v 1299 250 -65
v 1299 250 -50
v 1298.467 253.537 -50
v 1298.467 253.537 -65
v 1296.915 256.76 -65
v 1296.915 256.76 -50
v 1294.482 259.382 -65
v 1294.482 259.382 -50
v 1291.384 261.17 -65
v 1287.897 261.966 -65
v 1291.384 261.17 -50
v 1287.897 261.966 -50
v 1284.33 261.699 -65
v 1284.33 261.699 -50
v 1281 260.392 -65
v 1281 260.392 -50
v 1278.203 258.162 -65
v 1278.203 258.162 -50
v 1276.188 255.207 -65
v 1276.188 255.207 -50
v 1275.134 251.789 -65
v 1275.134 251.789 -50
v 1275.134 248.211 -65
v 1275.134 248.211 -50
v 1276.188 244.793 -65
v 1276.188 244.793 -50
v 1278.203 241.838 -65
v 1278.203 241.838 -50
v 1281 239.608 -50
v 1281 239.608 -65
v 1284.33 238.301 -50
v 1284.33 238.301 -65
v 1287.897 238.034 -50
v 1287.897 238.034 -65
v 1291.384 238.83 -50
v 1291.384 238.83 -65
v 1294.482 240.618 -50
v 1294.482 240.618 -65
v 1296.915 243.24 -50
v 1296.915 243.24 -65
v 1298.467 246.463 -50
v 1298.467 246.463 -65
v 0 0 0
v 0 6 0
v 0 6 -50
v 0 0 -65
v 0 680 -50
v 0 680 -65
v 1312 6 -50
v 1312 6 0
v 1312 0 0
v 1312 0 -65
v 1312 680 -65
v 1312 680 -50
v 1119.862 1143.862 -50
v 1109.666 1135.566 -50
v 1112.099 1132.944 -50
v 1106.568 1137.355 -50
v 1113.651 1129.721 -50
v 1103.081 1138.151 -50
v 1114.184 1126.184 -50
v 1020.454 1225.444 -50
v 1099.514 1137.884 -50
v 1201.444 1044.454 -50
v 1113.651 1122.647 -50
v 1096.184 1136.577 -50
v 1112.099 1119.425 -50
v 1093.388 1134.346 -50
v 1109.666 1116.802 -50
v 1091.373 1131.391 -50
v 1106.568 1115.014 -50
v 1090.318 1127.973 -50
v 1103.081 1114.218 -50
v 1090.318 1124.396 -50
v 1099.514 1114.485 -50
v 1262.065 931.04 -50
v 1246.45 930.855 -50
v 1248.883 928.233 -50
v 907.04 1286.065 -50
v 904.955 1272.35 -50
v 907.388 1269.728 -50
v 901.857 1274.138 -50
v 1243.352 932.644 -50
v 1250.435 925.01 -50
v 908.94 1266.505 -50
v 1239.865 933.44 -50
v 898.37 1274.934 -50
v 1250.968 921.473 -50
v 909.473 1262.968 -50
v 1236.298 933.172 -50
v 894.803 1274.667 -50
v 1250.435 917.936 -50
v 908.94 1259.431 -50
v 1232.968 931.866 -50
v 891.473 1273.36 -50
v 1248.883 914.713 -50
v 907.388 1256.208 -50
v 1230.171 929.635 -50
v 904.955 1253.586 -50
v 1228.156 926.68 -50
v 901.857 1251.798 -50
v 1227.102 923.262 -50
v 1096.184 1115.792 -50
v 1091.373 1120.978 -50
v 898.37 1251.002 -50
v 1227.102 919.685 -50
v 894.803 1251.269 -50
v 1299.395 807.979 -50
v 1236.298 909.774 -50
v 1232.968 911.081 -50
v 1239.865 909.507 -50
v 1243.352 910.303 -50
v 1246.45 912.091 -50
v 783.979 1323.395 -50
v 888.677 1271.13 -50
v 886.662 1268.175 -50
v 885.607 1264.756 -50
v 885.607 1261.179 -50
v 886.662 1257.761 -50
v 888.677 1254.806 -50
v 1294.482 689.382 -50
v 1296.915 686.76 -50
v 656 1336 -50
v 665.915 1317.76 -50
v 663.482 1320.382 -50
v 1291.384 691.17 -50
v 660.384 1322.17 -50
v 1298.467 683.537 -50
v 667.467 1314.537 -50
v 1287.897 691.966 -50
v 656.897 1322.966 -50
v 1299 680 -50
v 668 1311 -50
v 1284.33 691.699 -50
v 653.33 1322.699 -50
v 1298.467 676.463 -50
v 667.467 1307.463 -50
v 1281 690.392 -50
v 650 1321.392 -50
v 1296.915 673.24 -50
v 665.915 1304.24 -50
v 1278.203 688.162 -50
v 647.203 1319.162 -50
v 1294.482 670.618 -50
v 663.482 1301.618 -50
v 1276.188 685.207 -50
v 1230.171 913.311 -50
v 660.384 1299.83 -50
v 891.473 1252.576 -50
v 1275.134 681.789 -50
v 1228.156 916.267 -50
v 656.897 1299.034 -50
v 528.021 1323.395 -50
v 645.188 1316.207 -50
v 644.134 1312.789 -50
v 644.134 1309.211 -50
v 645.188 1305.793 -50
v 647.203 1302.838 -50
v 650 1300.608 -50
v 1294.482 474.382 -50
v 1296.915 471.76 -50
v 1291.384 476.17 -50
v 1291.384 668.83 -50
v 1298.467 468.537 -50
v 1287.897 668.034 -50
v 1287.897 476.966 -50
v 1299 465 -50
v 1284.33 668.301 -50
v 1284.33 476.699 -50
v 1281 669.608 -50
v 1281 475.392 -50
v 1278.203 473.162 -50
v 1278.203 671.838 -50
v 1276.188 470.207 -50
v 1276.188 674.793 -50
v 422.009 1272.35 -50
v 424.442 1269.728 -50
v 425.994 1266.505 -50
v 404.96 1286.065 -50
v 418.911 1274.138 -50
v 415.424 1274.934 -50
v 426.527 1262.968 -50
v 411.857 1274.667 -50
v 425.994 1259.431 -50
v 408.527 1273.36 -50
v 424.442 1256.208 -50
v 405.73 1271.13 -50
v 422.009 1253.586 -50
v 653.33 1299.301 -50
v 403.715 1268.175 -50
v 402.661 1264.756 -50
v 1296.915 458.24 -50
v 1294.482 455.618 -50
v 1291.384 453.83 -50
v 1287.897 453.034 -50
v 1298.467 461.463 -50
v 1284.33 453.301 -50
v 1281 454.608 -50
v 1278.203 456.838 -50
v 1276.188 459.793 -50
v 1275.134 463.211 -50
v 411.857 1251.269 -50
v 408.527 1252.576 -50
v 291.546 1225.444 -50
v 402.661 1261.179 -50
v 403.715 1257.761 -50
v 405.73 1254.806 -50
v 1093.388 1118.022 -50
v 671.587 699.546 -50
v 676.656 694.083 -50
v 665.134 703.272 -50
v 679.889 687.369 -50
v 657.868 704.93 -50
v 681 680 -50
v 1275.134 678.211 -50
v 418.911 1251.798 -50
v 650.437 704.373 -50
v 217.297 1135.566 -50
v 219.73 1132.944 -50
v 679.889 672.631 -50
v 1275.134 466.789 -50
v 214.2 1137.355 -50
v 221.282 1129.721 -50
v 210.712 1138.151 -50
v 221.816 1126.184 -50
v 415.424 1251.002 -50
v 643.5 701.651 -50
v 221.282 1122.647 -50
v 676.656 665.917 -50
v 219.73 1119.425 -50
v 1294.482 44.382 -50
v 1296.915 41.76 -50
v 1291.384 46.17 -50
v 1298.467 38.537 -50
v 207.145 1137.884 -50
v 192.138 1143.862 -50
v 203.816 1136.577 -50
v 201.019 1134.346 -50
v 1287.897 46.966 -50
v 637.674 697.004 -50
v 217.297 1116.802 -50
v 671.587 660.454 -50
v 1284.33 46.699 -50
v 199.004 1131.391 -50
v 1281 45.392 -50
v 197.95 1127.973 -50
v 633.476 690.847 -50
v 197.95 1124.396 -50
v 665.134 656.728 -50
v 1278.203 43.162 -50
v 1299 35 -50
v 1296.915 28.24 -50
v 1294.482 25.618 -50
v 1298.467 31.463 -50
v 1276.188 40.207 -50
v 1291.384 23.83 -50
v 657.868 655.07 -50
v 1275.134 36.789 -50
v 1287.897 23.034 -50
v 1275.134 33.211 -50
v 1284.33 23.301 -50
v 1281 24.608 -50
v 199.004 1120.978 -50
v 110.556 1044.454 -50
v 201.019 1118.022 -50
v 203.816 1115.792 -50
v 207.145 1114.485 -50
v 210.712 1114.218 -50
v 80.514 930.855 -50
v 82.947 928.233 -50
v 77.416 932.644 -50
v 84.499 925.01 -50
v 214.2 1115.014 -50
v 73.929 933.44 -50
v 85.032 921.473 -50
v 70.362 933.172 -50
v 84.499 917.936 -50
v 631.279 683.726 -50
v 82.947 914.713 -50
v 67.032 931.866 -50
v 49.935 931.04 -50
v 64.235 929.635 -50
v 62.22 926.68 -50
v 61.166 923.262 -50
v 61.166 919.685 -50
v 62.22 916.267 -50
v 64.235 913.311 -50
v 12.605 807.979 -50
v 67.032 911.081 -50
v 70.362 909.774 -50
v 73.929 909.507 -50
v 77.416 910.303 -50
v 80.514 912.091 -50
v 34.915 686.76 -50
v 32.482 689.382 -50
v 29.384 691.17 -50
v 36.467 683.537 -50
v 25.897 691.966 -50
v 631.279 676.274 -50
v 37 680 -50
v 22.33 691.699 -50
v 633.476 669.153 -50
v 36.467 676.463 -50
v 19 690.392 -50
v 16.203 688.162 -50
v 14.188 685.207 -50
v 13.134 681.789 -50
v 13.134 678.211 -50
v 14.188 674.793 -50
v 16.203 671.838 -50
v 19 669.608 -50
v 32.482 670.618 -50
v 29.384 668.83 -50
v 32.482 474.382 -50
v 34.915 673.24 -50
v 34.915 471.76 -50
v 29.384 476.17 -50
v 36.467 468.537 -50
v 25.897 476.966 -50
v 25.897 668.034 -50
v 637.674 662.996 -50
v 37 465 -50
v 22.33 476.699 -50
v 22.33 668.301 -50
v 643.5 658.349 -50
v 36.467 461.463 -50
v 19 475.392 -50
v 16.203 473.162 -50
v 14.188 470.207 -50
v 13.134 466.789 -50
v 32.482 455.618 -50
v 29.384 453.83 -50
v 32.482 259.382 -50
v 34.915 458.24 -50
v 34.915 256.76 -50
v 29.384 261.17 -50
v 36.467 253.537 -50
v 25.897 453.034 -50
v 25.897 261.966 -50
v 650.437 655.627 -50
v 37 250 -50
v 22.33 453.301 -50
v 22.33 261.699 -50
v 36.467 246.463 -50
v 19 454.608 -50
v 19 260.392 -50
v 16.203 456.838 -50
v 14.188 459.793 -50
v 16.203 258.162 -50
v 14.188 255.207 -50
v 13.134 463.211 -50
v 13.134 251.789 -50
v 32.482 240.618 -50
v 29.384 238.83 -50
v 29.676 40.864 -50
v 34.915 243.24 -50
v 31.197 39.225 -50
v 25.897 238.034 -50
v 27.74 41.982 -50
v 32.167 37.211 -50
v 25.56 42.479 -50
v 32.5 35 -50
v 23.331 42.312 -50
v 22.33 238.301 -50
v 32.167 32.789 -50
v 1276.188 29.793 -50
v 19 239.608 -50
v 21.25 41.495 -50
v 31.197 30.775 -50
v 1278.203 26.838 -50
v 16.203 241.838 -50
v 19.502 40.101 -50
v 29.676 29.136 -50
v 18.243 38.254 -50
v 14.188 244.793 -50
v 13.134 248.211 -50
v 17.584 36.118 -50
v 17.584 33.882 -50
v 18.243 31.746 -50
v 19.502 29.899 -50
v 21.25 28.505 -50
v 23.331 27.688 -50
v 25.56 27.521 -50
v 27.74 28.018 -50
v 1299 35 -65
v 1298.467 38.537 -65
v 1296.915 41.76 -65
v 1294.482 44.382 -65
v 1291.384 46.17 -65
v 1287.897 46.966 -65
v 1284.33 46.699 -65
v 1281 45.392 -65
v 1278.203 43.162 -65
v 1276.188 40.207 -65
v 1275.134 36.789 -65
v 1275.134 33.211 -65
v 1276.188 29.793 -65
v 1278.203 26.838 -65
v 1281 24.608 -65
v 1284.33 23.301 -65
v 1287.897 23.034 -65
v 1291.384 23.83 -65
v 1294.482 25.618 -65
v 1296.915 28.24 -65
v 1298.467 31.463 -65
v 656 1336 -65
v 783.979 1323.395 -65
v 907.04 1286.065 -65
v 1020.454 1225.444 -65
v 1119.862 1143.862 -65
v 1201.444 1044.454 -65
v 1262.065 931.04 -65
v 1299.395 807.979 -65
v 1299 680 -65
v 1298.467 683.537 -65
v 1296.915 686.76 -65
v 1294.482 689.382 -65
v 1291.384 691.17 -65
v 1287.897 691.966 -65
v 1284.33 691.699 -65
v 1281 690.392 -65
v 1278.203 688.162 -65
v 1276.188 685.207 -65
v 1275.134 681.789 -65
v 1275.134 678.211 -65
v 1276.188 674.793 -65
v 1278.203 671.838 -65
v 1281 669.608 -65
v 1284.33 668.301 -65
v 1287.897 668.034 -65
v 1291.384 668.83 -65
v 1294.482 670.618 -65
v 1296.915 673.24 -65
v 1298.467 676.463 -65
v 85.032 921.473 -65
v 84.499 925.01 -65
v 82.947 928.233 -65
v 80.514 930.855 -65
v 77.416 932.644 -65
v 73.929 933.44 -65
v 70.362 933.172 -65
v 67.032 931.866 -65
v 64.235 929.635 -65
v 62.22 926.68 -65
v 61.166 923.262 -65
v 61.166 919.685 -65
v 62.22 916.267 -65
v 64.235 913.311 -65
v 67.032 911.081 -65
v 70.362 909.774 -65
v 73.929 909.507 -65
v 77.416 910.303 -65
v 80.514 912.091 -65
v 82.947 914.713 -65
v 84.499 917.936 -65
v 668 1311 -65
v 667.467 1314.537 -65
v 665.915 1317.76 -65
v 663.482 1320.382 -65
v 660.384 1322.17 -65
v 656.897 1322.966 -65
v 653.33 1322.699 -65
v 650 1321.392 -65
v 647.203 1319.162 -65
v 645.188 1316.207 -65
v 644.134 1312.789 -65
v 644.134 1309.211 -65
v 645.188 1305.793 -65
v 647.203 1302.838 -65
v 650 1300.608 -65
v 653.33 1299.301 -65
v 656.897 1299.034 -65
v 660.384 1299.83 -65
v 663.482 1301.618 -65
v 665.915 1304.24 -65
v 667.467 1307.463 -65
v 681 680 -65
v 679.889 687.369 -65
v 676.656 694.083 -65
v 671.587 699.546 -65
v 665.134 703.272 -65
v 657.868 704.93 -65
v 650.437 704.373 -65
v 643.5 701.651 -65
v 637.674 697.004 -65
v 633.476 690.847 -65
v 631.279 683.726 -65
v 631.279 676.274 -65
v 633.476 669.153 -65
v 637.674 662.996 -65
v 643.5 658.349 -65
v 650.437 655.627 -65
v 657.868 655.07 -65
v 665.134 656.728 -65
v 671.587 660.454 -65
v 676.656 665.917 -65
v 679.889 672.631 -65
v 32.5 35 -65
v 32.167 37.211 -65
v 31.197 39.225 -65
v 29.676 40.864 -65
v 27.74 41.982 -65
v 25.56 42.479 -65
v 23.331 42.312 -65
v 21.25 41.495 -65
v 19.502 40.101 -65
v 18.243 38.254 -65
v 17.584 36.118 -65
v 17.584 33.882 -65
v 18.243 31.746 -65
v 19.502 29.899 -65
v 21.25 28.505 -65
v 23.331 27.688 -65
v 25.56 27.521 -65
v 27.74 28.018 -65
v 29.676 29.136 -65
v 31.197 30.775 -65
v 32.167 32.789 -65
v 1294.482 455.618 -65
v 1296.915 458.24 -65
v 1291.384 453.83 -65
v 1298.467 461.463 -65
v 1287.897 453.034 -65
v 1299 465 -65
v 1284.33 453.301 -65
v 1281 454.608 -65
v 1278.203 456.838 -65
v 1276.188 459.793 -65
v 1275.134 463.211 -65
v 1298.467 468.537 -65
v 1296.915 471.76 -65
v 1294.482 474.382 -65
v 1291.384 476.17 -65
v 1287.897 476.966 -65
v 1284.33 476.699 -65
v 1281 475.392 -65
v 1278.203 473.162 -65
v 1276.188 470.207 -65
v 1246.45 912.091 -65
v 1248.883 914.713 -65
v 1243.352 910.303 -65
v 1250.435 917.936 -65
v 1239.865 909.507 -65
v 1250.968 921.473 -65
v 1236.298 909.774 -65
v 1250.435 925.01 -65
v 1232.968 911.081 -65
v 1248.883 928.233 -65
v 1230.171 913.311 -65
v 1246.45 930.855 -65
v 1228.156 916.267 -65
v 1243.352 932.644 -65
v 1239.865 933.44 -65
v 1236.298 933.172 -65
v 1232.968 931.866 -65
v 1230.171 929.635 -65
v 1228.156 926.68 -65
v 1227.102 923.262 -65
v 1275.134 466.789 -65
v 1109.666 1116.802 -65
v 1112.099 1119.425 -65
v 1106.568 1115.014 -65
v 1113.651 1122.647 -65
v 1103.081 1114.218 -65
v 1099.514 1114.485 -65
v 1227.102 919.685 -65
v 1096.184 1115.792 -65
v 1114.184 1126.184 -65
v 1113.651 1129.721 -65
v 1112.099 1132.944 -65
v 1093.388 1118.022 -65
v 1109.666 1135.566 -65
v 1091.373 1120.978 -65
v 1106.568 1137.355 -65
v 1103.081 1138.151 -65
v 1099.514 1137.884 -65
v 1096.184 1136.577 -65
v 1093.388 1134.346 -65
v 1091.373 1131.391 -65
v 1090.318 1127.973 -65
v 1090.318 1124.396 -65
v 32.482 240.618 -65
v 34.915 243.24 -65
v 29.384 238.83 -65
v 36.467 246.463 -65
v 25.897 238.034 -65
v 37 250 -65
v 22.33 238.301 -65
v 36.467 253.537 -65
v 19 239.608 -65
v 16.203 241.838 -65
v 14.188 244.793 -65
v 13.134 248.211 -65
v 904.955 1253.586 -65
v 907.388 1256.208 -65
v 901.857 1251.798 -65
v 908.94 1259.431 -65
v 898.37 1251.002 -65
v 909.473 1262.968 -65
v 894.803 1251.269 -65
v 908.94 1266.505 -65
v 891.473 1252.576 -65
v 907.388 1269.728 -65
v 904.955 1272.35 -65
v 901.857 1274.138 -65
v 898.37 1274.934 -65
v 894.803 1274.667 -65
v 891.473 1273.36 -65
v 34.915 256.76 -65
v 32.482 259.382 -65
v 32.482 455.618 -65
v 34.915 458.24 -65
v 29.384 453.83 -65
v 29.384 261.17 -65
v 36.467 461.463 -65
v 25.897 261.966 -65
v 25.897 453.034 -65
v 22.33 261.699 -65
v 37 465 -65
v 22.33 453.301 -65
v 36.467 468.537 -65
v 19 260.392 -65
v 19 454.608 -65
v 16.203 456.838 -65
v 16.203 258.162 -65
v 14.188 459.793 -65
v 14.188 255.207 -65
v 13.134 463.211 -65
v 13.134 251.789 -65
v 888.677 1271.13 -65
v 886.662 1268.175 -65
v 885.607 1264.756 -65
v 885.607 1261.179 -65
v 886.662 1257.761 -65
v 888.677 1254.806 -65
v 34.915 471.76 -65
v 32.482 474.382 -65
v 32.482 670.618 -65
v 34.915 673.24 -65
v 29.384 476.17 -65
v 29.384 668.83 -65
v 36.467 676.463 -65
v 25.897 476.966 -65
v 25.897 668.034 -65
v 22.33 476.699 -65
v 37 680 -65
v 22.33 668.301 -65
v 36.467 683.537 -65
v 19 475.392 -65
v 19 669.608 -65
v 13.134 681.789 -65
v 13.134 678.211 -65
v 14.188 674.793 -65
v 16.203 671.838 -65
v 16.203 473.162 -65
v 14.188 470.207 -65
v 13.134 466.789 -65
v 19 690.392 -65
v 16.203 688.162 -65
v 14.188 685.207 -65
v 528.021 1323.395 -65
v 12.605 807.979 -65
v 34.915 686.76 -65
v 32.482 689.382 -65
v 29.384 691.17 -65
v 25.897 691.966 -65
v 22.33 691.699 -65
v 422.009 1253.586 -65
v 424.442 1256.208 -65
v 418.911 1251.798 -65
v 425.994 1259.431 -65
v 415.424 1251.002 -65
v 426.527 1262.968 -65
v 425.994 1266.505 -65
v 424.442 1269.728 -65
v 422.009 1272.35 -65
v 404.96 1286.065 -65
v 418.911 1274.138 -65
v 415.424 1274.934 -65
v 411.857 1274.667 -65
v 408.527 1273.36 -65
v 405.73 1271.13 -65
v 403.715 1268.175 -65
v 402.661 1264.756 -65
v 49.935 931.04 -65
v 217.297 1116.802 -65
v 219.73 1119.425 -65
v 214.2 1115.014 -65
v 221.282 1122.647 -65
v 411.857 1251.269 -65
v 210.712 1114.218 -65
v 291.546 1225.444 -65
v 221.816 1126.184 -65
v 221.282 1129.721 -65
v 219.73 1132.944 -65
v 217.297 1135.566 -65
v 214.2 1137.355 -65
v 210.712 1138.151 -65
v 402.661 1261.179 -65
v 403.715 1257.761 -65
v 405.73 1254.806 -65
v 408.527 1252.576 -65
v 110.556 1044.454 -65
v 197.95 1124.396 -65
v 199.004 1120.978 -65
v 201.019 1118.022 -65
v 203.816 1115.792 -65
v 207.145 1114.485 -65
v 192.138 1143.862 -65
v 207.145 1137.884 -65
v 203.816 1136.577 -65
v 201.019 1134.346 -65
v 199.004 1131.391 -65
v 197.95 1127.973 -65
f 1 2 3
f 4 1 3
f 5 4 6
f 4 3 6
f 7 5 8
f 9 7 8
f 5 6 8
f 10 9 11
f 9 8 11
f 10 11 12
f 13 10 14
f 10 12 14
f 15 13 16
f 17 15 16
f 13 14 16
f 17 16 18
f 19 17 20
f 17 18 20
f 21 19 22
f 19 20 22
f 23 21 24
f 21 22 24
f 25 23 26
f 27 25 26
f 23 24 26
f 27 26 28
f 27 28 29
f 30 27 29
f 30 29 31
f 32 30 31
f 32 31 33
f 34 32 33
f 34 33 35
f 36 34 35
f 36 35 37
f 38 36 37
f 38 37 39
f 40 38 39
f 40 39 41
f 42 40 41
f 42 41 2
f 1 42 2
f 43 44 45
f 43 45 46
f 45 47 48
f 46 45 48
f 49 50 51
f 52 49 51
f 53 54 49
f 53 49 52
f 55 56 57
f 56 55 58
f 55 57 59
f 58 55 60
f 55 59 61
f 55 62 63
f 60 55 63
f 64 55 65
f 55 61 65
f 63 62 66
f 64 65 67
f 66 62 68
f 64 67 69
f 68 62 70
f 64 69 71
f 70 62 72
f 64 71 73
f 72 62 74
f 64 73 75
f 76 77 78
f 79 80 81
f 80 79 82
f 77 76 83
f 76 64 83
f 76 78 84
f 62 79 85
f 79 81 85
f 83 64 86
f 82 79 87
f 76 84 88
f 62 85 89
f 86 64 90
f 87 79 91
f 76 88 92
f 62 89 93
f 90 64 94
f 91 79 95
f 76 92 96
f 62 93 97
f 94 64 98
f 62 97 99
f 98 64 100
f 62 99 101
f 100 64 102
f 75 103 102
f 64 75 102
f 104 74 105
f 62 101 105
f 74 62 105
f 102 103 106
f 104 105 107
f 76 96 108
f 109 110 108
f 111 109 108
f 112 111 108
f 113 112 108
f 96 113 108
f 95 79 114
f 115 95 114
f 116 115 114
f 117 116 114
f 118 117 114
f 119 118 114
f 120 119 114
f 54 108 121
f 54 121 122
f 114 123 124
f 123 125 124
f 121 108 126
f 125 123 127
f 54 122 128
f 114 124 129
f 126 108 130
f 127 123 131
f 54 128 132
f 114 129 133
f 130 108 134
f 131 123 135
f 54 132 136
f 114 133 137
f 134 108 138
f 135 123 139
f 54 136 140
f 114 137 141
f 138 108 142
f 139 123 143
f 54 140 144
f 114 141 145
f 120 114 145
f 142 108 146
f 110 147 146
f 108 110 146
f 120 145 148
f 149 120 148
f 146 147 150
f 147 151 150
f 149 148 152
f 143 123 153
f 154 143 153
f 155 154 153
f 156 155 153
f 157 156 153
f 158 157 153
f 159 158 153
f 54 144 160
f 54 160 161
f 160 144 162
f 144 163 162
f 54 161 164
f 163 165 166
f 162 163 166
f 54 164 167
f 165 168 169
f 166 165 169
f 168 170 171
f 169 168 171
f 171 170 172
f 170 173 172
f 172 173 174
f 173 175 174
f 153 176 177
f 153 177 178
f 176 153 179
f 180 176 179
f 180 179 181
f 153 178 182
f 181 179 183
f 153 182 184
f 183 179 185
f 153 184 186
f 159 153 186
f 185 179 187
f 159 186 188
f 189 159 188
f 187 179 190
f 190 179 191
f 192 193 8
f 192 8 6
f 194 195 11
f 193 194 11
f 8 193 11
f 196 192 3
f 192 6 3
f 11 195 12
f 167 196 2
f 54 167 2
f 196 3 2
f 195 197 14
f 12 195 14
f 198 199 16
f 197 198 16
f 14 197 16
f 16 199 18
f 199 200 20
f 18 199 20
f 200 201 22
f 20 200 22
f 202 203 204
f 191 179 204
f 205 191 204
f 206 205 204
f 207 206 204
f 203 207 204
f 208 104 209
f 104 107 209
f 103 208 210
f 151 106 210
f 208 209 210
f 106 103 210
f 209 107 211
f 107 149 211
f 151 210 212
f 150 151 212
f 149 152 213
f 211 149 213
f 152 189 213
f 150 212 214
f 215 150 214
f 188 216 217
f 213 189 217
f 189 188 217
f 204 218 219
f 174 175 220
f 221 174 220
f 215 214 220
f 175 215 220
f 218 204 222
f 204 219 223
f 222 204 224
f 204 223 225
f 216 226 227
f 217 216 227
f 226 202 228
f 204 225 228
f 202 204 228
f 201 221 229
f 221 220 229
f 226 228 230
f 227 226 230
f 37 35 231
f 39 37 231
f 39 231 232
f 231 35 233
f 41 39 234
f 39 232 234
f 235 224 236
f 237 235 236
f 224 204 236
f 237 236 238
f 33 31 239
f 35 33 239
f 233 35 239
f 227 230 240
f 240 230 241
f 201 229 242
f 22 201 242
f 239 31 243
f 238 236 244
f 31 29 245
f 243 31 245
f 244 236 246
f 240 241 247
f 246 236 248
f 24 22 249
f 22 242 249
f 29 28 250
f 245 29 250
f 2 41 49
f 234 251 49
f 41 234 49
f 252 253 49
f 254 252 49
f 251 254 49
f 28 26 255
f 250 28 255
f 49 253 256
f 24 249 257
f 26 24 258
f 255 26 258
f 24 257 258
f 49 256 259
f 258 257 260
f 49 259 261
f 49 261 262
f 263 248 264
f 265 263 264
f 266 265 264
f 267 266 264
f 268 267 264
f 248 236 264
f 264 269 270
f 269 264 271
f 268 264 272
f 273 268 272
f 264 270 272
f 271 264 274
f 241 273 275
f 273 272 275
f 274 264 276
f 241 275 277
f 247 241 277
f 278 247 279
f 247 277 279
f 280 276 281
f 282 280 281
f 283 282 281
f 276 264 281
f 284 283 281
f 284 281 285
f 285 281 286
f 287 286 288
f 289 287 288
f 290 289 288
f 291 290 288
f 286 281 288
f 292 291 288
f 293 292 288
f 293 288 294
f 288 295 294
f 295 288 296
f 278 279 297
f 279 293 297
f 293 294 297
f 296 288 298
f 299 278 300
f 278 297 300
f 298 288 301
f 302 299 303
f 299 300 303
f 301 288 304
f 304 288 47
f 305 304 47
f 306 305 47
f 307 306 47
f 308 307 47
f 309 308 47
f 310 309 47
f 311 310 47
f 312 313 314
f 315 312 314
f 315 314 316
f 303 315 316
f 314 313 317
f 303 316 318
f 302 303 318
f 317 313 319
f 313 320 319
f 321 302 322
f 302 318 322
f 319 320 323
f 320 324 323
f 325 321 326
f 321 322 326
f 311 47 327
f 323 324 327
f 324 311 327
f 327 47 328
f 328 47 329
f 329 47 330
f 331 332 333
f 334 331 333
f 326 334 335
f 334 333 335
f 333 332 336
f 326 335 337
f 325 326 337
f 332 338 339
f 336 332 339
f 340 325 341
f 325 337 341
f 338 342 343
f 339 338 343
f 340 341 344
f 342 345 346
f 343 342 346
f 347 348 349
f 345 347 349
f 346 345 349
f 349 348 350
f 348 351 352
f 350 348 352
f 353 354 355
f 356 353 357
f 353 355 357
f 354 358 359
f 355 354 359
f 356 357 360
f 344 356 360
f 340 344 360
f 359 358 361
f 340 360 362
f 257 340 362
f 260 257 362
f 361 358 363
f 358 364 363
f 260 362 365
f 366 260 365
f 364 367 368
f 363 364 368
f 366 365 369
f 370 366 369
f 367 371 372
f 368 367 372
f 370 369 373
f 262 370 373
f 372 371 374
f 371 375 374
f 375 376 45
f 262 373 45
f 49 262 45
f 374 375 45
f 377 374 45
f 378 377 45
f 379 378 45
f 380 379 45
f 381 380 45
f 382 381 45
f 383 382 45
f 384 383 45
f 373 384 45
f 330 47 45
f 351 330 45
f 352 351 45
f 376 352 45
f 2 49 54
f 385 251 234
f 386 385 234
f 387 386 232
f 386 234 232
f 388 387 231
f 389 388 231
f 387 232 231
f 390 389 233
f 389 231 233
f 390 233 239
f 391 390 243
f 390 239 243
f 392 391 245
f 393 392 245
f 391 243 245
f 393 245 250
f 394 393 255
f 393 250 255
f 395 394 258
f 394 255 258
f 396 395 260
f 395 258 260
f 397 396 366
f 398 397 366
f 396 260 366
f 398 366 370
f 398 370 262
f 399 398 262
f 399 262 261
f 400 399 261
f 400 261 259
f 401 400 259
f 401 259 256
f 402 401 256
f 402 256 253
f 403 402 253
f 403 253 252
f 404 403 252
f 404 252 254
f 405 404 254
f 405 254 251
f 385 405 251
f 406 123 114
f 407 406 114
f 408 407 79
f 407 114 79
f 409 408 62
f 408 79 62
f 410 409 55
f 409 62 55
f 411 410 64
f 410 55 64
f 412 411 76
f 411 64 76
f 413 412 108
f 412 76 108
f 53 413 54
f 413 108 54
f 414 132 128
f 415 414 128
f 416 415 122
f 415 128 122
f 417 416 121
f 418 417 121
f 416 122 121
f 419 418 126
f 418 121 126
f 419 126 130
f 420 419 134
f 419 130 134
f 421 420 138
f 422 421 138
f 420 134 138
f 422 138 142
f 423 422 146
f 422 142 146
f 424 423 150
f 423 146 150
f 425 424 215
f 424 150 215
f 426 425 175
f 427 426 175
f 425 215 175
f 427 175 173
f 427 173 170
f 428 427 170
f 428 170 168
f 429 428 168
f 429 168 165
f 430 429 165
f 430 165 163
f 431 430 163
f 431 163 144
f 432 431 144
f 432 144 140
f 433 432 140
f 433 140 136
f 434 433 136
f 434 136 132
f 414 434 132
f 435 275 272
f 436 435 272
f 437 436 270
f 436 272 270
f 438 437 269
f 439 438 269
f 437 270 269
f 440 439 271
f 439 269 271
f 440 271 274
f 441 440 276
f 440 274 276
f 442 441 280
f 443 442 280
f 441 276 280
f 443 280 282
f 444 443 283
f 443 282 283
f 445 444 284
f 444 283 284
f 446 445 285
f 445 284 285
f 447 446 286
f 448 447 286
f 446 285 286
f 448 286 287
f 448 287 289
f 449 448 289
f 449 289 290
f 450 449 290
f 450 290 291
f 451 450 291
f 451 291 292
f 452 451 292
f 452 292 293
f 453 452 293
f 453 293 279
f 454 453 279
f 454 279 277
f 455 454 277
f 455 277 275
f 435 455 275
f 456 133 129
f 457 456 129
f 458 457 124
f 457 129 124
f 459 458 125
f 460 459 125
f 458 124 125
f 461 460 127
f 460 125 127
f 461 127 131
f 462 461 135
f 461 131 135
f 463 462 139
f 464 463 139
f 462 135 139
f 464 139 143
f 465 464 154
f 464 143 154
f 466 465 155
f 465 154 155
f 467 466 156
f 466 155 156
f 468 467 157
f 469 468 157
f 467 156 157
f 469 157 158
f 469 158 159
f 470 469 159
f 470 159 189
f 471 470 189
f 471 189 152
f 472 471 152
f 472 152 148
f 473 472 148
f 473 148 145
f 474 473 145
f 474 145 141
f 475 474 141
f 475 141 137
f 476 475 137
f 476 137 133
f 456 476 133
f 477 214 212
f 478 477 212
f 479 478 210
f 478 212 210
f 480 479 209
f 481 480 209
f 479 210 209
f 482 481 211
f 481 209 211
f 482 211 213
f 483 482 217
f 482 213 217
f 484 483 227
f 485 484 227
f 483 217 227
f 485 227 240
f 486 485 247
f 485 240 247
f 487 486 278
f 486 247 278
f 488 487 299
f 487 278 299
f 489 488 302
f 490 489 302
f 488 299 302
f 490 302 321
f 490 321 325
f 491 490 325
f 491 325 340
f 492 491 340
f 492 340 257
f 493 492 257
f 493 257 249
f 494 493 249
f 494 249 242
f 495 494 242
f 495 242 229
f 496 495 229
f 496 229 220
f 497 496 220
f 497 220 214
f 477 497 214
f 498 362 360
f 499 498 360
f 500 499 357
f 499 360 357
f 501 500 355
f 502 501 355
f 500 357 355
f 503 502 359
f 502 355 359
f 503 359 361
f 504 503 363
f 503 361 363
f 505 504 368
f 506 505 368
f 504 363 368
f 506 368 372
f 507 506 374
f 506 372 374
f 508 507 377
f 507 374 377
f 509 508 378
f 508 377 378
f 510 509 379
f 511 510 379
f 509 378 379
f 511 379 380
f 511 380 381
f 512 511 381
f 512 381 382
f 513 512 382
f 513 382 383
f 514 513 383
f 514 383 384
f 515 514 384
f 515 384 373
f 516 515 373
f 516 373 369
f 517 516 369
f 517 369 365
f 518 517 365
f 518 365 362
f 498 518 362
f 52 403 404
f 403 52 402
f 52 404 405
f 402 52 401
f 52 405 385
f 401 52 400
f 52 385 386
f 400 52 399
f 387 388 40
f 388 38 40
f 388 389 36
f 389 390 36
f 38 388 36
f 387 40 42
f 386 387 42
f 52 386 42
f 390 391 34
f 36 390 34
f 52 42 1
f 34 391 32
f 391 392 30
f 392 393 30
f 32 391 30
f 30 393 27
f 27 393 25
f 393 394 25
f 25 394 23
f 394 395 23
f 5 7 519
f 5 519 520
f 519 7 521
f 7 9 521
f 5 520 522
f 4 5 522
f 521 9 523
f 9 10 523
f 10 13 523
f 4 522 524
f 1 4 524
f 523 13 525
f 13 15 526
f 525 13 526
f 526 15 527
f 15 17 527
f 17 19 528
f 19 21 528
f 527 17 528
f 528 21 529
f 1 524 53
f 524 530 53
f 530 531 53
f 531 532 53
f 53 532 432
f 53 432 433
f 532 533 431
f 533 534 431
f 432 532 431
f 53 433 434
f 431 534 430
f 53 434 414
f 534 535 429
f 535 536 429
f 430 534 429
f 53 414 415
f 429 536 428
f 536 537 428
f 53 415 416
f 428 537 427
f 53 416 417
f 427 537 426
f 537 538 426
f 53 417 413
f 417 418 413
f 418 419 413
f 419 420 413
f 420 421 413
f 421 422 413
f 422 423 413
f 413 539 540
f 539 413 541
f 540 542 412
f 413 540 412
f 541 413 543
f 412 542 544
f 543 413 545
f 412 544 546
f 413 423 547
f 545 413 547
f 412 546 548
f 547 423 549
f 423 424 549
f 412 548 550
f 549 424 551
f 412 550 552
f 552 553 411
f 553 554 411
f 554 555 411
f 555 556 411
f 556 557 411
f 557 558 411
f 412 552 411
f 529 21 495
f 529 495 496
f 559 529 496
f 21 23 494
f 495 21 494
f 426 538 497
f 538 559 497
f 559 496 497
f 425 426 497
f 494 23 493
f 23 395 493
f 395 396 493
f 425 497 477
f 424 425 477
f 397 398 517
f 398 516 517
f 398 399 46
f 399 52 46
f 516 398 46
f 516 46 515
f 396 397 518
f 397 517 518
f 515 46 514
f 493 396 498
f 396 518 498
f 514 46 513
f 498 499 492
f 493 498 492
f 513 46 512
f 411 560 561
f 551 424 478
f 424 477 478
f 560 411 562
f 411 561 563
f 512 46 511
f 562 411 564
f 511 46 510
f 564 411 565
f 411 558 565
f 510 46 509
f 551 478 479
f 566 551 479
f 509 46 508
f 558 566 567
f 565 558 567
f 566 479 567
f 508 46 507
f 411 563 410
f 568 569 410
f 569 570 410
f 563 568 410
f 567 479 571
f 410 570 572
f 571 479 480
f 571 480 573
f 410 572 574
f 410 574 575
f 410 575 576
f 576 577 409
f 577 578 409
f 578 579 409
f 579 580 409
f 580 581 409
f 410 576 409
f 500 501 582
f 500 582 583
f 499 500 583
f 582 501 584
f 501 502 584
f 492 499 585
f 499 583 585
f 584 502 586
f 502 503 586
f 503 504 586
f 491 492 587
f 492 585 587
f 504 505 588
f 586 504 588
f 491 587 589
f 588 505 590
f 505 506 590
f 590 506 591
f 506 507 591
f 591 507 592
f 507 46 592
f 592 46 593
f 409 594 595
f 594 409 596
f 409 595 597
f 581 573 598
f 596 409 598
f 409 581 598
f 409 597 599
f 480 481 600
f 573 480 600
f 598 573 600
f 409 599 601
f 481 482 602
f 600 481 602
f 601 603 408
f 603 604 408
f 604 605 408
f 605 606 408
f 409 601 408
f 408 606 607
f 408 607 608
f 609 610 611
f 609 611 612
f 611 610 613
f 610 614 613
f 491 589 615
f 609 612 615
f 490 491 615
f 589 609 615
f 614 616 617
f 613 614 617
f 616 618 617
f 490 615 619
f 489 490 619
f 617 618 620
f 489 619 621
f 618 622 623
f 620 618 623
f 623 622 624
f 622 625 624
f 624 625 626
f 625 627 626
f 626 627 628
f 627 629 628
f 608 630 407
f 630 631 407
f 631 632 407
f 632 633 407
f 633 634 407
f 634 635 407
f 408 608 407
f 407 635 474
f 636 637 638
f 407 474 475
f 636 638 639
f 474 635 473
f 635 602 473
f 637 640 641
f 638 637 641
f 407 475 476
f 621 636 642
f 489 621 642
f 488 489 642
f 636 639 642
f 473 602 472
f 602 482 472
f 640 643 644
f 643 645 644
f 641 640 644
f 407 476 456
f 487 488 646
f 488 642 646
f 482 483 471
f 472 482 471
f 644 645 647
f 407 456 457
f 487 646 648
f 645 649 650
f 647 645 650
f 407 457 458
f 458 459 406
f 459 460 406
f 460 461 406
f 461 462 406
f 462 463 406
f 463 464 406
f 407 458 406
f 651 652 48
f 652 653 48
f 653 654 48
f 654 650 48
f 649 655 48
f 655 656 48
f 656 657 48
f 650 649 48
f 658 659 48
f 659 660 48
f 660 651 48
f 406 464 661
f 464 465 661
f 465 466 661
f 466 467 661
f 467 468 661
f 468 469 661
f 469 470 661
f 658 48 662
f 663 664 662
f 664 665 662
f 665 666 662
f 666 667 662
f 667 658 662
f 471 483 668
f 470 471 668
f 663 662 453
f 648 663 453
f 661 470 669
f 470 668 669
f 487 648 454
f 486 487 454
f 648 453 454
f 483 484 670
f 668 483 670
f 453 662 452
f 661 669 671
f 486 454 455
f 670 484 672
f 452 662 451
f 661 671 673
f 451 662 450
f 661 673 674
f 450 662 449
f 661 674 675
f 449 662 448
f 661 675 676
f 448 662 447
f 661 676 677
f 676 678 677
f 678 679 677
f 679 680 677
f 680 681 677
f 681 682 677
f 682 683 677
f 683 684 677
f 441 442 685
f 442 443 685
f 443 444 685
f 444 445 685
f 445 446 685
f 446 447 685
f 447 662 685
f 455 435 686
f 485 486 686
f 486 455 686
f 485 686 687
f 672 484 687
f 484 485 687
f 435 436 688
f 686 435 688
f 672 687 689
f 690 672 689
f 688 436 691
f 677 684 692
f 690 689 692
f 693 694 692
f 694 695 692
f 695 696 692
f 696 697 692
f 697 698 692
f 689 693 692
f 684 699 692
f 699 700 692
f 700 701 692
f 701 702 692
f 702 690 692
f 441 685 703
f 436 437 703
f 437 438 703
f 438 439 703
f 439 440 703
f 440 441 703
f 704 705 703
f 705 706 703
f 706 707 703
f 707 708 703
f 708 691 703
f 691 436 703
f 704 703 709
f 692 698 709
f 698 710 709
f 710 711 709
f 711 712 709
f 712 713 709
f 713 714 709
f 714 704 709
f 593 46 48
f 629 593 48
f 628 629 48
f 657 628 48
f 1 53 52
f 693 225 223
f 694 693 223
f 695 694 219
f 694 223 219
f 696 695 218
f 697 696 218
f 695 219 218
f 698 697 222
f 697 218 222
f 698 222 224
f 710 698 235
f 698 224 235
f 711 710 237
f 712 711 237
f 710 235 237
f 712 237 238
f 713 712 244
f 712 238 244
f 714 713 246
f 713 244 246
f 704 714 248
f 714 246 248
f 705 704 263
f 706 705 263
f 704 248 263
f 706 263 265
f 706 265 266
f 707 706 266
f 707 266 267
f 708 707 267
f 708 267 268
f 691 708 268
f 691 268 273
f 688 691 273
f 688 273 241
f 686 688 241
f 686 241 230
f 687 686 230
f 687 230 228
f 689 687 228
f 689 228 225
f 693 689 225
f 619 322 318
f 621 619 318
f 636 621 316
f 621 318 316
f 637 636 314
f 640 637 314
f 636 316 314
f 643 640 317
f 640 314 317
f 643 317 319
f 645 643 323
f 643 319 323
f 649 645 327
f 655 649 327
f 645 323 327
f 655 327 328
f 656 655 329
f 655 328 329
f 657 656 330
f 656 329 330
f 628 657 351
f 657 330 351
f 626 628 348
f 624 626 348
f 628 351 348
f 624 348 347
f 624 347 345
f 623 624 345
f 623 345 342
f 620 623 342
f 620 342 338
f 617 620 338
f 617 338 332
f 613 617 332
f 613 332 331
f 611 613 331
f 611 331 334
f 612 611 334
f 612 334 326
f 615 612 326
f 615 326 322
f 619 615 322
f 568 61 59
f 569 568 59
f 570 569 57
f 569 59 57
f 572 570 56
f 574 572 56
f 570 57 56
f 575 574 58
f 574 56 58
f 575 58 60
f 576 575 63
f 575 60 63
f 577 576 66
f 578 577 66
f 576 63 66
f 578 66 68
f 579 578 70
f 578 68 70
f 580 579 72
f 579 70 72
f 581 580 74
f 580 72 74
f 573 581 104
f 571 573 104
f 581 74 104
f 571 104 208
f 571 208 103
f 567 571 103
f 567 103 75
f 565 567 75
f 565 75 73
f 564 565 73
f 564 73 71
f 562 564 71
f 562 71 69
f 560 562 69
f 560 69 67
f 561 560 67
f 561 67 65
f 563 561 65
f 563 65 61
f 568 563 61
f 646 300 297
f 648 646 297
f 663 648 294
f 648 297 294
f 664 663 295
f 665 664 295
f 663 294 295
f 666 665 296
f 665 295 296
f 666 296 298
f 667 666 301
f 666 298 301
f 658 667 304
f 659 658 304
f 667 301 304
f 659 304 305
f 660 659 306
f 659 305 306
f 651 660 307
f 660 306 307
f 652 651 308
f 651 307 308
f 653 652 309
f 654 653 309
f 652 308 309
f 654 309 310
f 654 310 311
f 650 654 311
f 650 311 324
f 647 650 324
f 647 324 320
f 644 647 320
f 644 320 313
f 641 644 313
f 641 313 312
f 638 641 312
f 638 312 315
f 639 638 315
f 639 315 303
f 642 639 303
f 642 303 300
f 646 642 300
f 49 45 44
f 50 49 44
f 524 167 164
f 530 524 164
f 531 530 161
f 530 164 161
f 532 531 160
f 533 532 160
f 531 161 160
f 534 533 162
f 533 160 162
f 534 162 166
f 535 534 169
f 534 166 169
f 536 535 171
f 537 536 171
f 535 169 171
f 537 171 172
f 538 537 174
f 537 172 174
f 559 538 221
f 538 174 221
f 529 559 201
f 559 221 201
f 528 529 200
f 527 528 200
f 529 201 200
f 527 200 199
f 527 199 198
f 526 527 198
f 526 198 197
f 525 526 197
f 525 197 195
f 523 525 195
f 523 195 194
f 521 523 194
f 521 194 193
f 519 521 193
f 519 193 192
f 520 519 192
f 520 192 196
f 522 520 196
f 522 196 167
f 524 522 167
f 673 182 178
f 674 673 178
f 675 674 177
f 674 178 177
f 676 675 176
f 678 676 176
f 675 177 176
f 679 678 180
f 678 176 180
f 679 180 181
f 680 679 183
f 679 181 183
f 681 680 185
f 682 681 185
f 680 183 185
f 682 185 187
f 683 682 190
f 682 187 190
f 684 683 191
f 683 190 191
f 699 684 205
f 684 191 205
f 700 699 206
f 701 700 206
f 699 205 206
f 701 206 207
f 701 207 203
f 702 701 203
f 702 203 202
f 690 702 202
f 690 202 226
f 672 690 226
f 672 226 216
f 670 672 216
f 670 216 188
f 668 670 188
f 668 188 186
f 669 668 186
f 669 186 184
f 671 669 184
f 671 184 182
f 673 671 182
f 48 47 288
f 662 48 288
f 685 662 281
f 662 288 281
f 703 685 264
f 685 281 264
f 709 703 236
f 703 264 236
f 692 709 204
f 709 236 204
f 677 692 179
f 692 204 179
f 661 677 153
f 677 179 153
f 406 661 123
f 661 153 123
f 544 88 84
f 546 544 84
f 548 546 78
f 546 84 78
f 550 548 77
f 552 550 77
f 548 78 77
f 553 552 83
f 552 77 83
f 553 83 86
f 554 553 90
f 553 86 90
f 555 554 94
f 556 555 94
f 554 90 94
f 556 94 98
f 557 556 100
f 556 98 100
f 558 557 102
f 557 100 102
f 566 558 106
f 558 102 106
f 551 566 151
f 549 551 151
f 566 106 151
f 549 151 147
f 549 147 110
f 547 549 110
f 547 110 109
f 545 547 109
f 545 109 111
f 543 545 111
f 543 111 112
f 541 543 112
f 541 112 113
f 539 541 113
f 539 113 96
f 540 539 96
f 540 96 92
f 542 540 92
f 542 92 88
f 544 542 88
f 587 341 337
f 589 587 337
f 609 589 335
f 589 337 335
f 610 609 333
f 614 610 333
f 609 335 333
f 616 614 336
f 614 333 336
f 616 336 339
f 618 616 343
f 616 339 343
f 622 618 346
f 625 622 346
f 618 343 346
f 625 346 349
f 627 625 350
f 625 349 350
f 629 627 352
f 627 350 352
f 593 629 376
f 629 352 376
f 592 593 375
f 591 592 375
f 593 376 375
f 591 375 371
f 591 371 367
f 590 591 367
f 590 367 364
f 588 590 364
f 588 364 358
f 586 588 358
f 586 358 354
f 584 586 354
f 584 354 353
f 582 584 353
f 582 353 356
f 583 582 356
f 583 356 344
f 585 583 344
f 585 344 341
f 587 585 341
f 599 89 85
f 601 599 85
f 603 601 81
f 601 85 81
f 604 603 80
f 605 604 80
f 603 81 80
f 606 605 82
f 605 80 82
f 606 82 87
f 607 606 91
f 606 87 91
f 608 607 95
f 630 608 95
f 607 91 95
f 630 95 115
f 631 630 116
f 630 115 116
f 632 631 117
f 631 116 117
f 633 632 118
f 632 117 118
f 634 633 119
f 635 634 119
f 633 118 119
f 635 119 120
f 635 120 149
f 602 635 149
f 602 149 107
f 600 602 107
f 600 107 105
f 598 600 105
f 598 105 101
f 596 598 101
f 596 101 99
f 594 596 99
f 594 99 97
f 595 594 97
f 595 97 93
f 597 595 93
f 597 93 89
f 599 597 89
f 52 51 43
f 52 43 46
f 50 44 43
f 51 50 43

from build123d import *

# Parameters (mm, degrees)
EXTRUDE_1_DEPTH     = 1312
CUT_EXTRUDE_1_REACH = 17
SKETCH_2_R          = 25
CUT_EXTRUDE_2_REACH = 17
CUT_EXTRUDE_3_REACH = 17
SKETCH_4_R          = 7.5
SKETCH_4_R_2        = 12


with BuildPart() as part:
    # 스케치1 → 보스-돌출1 (new body)
    with BuildSketch(Plane(origin=(0, 0, 0), x_dir=(0, 0, -1), z_dir=(1, 0, 0))):
        Polygon((0, 0), (65, 0), (65, 1336), (50, 1336), (50, 6), (0, 6), align=None)
    extrude(amount=EXTRUDE_1_DEPTH)

    # 스케치2 → 컷-돌출1 (cut, up to next)
    with BuildSketch(Plane.XY.offset(-50), mode=Mode.PRIVATE) as cut_extrude_1_sk1:
        with Locations((656, 680)):
            Circle(SKETCH_2_R)
    cut_extrude_1_tool1 = extrude(cut_extrude_1_sk1.sketch, amount=-CUT_EXTRUDE_1_REACH, mode=Mode.PRIVATE) & part.part
    add(cut_extrude_1_tool1.solids().sort_by_distance((656, 680, -50))[0], mode=Mode.SUBTRACT)

    # 스케치3 → 컷-돌출2 (cut, up to next)
    with BuildSketch(Plane.XY.offset(-50), mode=Mode.PRIVATE) as cut_extrude_2_sk1:
        with BuildLine():
            ThreePointArc((0, 680), (192.137951542, 1143.862048458), (656, 1336))
            Line((656, 1336), (0, 1336))
            Line((0, 1336), (0, 680))
        make_face()
    cut_extrude_2_tool1 = extrude(cut_extrude_2_sk1.sketch, amount=-CUT_EXTRUDE_2_REACH, mode=Mode.PRIVATE) & part.part
    add(cut_extrude_2_tool1.solids().sort_by_distance((146.529368, 1189.470632, -50))[0], mode=Mode.SUBTRACT)
    # 스케치3 → 컷-돌출2 (cut, up to next)
    with BuildSketch(Plane.XY.offset(-50), mode=Mode.PRIVATE) as cut_extrude_2_sk2:
        with BuildLine():
            Line((1312, 680), (1312, 1336))
            Line((1312, 1336), (656, 1336))
            ThreePointArc((656, 1336), (1119.862048458, 1143.862048458), (1312, 680))
        make_face()
    cut_extrude_2_tool2 = extrude(cut_extrude_2_sk2.sketch, amount=-CUT_EXTRUDE_2_REACH, mode=Mode.PRIVATE) & part.part
    add(cut_extrude_2_tool2.solids().sort_by_distance((1165.470632, 1189.470632, -50))[0], mode=Mode.SUBTRACT)

    # 스케치4 → 컷-돌출3 (cut, up to next)
    with BuildSketch(Plane.XY.offset(-50), mode=Mode.PRIVATE) as cut_extrude_3_sk1:
        with Locations((25, 35)):
            Circle(SKETCH_4_R)
    cut_extrude_3_tool1 = extrude(cut_extrude_3_sk1.sketch, amount=-CUT_EXTRUDE_3_REACH, mode=Mode.PRIVATE) & part.part
    add(cut_extrude_3_tool1.solids().sort_by_distance((25, 35, -50))[0], mode=Mode.SUBTRACT)
    # 스케치4 → 컷-돌출3 (cut, up to next)
    with BuildSketch(Plane.XY.offset(-50), mode=Mode.PRIVATE) as cut_extrude_3_sk2:
        with Locations((25, 250)):
            Circle(SKETCH_4_R_2)
    cut_extrude_3_tool2 = extrude(cut_extrude_3_sk2.sketch, amount=-CUT_EXTRUDE_3_REACH, mode=Mode.PRIVATE) & part.part
    add(cut_extrude_3_tool2.solids().sort_by_distance((25, 250, -50))[0], mode=Mode.SUBTRACT)
    # 스케치4 → 컷-돌출3 (cut, up to next)
    with BuildSketch(Plane.XY.offset(-50), mode=Mode.PRIVATE) as cut_extrude_3_sk3:
        with Locations((25, 465)):
            Circle(SKETCH_4_R_2)
    cut_extrude_3_tool3 = extrude(cut_extrude_3_sk3.sketch, amount=-CUT_EXTRUDE_3_REACH, mode=Mode.PRIVATE) & part.part
    add(cut_extrude_3_tool3.solids().sort_by_distance((25, 465, -50))[0], mode=Mode.SUBTRACT)
    # 스케치4 → 컷-돌출3 (cut, up to next)
    with BuildSketch(Plane.XY.offset(-50), mode=Mode.PRIVATE) as cut_extrude_3_sk4:
        with Locations((25, 680)):
            Circle(SKETCH_4_R_2)
    cut_extrude_3_tool4 = extrude(cut_extrude_3_sk4.sketch, amount=-CUT_EXTRUDE_3_REACH, mode=Mode.PRIVATE) & part.part
    add(cut_extrude_3_tool4.solids().sort_by_distance((25, 680, -50))[0], mode=Mode.SUBTRACT)
    # 스케치4 → 컷-돌출3 (cut, up to next)
    with BuildSketch(Plane.XY.offset(-50), mode=Mode.PRIVATE) as cut_extrude_3_sk5:
        with Locations((73.032014985, 921.473245822)):
            Circle(SKETCH_4_R_2)
    cut_extrude_3_tool5 = extrude(cut_extrude_3_sk5.sketch, amount=-CUT_EXTRUDE_3_REACH, mode=Mode.PRIVATE) & part.part
    add(cut_extrude_3_tool5.solids().sort_by_distance((73.032015, 921.473246, -50))[0], mode=Mode.SUBTRACT)
    # 스케치4 → 컷-돌출3 (cut, up to next)
    with BuildSketch(Plane.XY.offset(-50), mode=Mode.PRIVATE) as cut_extrude_3_sk6:
        with Locations((209.815621071, 1126.184378929)):
            Circle(SKETCH_4_R_2)
    cut_extrude_3_tool6 = extrude(cut_extrude_3_sk6.sketch, amount=-CUT_EXTRUDE_3_REACH, mode=Mode.PRIVATE) & part.part
    add(cut_extrude_3_tool6.solids().sort_by_distance((209.815621, 1126.184379, -50))[0], mode=Mode.SUBTRACT)
    # 스케치4 → 컷-돌출3 (cut, up to next)
    with BuildSketch(Plane.XY.offset(-50), mode=Mode.PRIVATE) as cut_extrude_3_sk7:
        with Locations((414.526754178, 1262.967985015)):
            Circle(SKETCH_4_R_2)
    cut_extrude_3_tool7 = extrude(cut_extrude_3_sk7.sketch, amount=-CUT_EXTRUDE_3_REACH, mode=Mode.PRIVATE) & part.part
    add(cut_extrude_3_tool7.solids().sort_by_distance((414.526754, 1262.967985, -50))[0], mode=Mode.SUBTRACT)
    # 스케치4 → 컷-돌출3 (cut, up to next)
    with BuildSketch(Plane.XY.offset(-50), mode=Mode.PRIVATE) as cut_extrude_3_sk8:
        with Locations((656, 1311)):
            Circle(SKETCH_4_R_2)
    cut_extrude_3_tool8 = extrude(cut_extrude_3_sk8.sketch, amount=-CUT_EXTRUDE_3_REACH, mode=Mode.PRIVATE) & part.part
    add(cut_extrude_3_tool8.solids().sort_by_distance((656, 1311, -50))[0], mode=Mode.SUBTRACT)
    # 스케치4 → 컷-돌출3 (cut, up to next)
    with BuildSketch(Plane.XY.offset(-50), mode=Mode.PRIVATE) as cut_extrude_3_sk9:
        with Locations((897.473245822, 1262.967985015)):
            Circle(SKETCH_4_R_2)
    cut_extrude_3_tool9 = extrude(cut_extrude_3_sk9.sketch, amount=-CUT_EXTRUDE_3_REACH, mode=Mode.PRIVATE) & part.part
    add(cut_extrude_3_tool9.solids().sort_by_distance((897.473246, 1262.967985, -50))[0], mode=Mode.SUBTRACT)
    # 스케치4 → 컷-돌출3 (cut, up to next)
    with BuildSketch(Plane.XY.offset(-50), mode=Mode.PRIVATE) as cut_extrude_3_sk10:
        with Locations((1102.184378929, 1126.184378929)):
            Circle(SKETCH_4_R_2)
    cut_extrude_3_tool10 = extrude(cut_extrude_3_sk10.sketch, amount=-CUT_EXTRUDE_3_REACH, mode=Mode.PRIVATE) & part.part
    add(cut_extrude_3_tool10.solids().sort_by_distance((1102.184379, 1126.184379, -50))[0], mode=Mode.SUBTRACT)
    # 스케치4 → 컷-돌출3 (cut, up to next)
    with BuildSketch(Plane.XY.offset(-50), mode=Mode.PRIVATE) as cut_extrude_3_sk11:
        with Locations((1238.967985015, 921.473245822)):
            Circle(SKETCH_4_R_2)
    cut_extrude_3_tool11 = extrude(cut_extrude_3_sk11.sketch, amount=-CUT_EXTRUDE_3_REACH, mode=Mode.PRIVATE) & part.part
    add(cut_extrude_3_tool11.solids().sort_by_distance((1238.967985, 921.473246, -50))[0], mode=Mode.SUBTRACT)
    # 스케치4 → 컷-돌출3 (cut, up to next)
    with BuildSketch(Plane.XY.offset(-50), mode=Mode.PRIVATE) as cut_extrude_3_sk12:
        with Locations((1287, 680)):
            Circle(SKETCH_4_R_2)
    cut_extrude_3_tool12 = extrude(cut_extrude_3_sk12.sketch, amount=-CUT_EXTRUDE_3_REACH, mode=Mode.PRIVATE) & part.part
    add(cut_extrude_3_tool12.solids().sort_by_distance((1287, 680, -50))[0], mode=Mode.SUBTRACT)
    # 스케치4 → 컷-돌출3 (cut, up to next)
    with BuildSketch(Plane.XY.offset(-50), mode=Mode.PRIVATE) as cut_extrude_3_sk13:
        with Locations((1287, 465)):
            Circle(SKETCH_4_R_2)
    cut_extrude_3_tool13 = extrude(cut_extrude_3_sk13.sketch, amount=-CUT_EXTRUDE_3_REACH, mode=Mode.PRIVATE) & part.part
    add(cut_extrude_3_tool13.solids().sort_by_distance((1287, 465, -50))[0], mode=Mode.SUBTRACT)
    # 스케치4 → 컷-돌출3 (cut, up to next)
    with BuildSketch(Plane.XY.offset(-50), mode=Mode.PRIVATE) as cut_extrude_3_sk14:
        with Locations((1287, 250)):
            Circle(SKETCH_4_R_2)
    cut_extrude_3_tool14 = extrude(cut_extrude_3_sk14.sketch, amount=-CUT_EXTRUDE_3_REACH, mode=Mode.PRIVATE) & part.part
    add(cut_extrude_3_tool14.solids().sort_by_distance((1287, 250, -50))[0], mode=Mode.SUBTRACT)
    # 스케치4 → 컷-돌출3 (cut, up to next)
    with BuildSketch(Plane.XY.offset(-50), mode=Mode.PRIVATE) as cut_extrude_3_sk15:
        with Locations((1287, 35)):
            Circle(SKETCH_4_R_2)
    cut_extrude_3_tool15 = extrude(cut_extrude_3_sk15.sketch, amount=-CUT_EXTRUDE_3_REACH, mode=Mode.PRIVATE) & part.part
    add(cut_extrude_3_tool15.solids().sort_by_distance((1287, 35, -50))[0], mode=Mode.SUBTRACT)


solid = part.part
